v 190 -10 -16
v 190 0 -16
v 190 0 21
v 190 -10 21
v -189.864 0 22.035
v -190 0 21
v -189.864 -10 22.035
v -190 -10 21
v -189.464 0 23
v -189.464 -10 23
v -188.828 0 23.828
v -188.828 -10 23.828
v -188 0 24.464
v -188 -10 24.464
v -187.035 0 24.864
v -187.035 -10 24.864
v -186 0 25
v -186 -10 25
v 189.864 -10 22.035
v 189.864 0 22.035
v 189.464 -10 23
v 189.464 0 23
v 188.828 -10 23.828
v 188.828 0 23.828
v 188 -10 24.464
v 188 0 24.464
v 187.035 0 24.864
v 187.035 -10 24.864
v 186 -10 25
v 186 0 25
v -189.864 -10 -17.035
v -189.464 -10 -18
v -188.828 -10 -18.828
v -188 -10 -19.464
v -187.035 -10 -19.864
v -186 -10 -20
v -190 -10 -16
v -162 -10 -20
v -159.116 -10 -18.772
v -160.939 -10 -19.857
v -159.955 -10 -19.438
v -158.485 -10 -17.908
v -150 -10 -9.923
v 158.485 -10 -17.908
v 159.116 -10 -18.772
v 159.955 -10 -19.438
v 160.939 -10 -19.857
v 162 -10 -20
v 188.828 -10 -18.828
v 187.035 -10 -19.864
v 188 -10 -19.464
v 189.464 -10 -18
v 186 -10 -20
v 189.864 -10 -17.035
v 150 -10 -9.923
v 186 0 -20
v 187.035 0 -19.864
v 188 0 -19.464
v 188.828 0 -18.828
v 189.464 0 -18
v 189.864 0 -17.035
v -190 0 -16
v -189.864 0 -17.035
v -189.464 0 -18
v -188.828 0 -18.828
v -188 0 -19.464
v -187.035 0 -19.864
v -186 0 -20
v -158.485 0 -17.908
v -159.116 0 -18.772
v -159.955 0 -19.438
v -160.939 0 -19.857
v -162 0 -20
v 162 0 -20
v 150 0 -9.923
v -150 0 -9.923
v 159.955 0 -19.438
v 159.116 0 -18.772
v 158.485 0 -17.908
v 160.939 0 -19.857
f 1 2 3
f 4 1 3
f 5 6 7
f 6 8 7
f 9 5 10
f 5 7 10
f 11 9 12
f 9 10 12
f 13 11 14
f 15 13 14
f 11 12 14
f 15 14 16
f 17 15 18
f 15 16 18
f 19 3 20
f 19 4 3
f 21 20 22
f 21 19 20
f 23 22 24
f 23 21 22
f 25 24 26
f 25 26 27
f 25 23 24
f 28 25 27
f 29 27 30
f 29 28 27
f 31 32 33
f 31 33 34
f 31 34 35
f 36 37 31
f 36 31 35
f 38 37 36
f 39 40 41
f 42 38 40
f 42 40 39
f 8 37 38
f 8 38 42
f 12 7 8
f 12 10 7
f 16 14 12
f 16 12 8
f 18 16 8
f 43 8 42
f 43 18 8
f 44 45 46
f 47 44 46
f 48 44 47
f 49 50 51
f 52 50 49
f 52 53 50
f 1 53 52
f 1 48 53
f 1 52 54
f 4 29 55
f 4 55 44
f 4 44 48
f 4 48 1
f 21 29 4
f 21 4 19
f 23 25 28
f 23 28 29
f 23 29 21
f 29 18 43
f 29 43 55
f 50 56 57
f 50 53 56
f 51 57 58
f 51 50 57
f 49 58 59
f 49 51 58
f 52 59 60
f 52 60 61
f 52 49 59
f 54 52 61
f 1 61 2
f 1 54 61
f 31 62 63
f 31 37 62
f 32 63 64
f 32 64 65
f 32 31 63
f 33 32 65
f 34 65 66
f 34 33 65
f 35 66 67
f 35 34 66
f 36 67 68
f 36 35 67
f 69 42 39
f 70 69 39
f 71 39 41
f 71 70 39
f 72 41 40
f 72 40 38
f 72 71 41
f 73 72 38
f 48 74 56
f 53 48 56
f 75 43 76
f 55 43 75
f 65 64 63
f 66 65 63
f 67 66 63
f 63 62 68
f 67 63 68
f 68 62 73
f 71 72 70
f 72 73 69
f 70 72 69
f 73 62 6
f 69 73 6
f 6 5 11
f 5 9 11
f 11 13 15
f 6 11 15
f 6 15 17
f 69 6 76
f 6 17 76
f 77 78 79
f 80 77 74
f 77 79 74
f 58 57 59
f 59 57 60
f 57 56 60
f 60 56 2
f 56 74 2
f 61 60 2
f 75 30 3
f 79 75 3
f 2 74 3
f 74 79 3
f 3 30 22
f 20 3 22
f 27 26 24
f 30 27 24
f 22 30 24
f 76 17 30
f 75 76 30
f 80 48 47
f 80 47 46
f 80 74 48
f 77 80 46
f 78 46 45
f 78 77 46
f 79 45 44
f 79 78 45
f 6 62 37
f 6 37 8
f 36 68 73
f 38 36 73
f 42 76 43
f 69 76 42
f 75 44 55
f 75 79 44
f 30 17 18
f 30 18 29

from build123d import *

# Parameters (mm, degrees)
SKETCH_W     = 380
SKETCH_H     = 45
PAD_DEPTH    = 10
FILLET_R     = 4
SKETCH001_W  = 316
SKETCH001_H  = 14.743673
POCKET_DEPTH = 10
FILLET001_R  = 4
CHAMFER_SIZE = 8


with BuildPart() as part:
    # Sketch → Pad (new body)
    with BuildSketch(Plane.XZ):
        with Locations((0, 2.5)):
            Rectangle(SKETCH_W, SKETCH_H)
    extrude(amount=PAD_DEPTH)

    # Fillet
    fillet_edges = [part.edges().sort_by_distance(p)[0] for p in [
        (-190, -5, 25),
        (-190, -5, -20),
        (190, -5, -20),
        (190, -5, 25),
    ]]
    fillet(fillet_edges, radius=FILLET_R)

    # Sketch001 (on Face5 of Fillet) → Pocket (cut)
    with BuildSketch(Plane.XZ.offset(10)):
        with Locations((0, -17.294962)):
            Rectangle(SKETCH001_W, SKETCH001_H)
    extrude(amount=-POCKET_DEPTH, mode=Mode.SUBTRACT)

    # Fillet001
    fillet001_edges = [part.edges().sort_by_distance(p)[0] for p in [
        (-158, -5, -20),
        (158, -5, -20),
    ]]
    fillet(fillet001_edges, radius=FILLET001_R)

    # Chamfer
    chamfer_edges = [part.edges().sort_by_distance(p)[0] for p in [
        (-158, -5, -9.923126),
        (158, -5, -9.923126),
    ]]
    chamfer(chamfer_edges, length=CHAMFER_SIZE)


solid = part.part
